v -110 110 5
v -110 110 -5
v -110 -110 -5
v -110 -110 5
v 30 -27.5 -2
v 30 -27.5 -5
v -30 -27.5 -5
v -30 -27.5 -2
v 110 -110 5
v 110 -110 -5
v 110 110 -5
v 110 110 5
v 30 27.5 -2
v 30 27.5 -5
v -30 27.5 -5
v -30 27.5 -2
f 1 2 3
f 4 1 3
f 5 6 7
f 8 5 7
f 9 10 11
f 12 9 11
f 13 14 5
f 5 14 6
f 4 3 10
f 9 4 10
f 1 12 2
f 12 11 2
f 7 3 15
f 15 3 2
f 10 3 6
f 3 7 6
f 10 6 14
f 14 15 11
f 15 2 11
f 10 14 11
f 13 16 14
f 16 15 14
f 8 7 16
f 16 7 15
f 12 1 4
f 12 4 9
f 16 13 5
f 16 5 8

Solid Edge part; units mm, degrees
sketch "Sketch1" plane through (0, 0, 0) normal (0, 0, 1) x (1, 0, 0)
  line L0 (-110, -110) -> (110, -110)
  line L1 (110, -110) -> (110, 110)
  line L2 (110, 110) -> (-110, 110)
  line L3 (-110, 110) -> (-110, -110)
extrude "Protrusion1" add sketch "Sketch1" along normal mid plane 10
sketch "Sketch2" plane through (0, 0, -5) normal (0, 0, -1) x (1, 0, 0)
  line L0 (-30, -27.5) -> (30, -27.5)
  line L1 (30, -27.5) -> (30, 27.5)
  line L2 (30, 27.5) -> (-30, 27.5)
  line L3 (-30, 27.5) -> (-30, -27.5)
extrude "ExtrudedCutout_1" cut sketch "Sketch2" against normal blind 3
